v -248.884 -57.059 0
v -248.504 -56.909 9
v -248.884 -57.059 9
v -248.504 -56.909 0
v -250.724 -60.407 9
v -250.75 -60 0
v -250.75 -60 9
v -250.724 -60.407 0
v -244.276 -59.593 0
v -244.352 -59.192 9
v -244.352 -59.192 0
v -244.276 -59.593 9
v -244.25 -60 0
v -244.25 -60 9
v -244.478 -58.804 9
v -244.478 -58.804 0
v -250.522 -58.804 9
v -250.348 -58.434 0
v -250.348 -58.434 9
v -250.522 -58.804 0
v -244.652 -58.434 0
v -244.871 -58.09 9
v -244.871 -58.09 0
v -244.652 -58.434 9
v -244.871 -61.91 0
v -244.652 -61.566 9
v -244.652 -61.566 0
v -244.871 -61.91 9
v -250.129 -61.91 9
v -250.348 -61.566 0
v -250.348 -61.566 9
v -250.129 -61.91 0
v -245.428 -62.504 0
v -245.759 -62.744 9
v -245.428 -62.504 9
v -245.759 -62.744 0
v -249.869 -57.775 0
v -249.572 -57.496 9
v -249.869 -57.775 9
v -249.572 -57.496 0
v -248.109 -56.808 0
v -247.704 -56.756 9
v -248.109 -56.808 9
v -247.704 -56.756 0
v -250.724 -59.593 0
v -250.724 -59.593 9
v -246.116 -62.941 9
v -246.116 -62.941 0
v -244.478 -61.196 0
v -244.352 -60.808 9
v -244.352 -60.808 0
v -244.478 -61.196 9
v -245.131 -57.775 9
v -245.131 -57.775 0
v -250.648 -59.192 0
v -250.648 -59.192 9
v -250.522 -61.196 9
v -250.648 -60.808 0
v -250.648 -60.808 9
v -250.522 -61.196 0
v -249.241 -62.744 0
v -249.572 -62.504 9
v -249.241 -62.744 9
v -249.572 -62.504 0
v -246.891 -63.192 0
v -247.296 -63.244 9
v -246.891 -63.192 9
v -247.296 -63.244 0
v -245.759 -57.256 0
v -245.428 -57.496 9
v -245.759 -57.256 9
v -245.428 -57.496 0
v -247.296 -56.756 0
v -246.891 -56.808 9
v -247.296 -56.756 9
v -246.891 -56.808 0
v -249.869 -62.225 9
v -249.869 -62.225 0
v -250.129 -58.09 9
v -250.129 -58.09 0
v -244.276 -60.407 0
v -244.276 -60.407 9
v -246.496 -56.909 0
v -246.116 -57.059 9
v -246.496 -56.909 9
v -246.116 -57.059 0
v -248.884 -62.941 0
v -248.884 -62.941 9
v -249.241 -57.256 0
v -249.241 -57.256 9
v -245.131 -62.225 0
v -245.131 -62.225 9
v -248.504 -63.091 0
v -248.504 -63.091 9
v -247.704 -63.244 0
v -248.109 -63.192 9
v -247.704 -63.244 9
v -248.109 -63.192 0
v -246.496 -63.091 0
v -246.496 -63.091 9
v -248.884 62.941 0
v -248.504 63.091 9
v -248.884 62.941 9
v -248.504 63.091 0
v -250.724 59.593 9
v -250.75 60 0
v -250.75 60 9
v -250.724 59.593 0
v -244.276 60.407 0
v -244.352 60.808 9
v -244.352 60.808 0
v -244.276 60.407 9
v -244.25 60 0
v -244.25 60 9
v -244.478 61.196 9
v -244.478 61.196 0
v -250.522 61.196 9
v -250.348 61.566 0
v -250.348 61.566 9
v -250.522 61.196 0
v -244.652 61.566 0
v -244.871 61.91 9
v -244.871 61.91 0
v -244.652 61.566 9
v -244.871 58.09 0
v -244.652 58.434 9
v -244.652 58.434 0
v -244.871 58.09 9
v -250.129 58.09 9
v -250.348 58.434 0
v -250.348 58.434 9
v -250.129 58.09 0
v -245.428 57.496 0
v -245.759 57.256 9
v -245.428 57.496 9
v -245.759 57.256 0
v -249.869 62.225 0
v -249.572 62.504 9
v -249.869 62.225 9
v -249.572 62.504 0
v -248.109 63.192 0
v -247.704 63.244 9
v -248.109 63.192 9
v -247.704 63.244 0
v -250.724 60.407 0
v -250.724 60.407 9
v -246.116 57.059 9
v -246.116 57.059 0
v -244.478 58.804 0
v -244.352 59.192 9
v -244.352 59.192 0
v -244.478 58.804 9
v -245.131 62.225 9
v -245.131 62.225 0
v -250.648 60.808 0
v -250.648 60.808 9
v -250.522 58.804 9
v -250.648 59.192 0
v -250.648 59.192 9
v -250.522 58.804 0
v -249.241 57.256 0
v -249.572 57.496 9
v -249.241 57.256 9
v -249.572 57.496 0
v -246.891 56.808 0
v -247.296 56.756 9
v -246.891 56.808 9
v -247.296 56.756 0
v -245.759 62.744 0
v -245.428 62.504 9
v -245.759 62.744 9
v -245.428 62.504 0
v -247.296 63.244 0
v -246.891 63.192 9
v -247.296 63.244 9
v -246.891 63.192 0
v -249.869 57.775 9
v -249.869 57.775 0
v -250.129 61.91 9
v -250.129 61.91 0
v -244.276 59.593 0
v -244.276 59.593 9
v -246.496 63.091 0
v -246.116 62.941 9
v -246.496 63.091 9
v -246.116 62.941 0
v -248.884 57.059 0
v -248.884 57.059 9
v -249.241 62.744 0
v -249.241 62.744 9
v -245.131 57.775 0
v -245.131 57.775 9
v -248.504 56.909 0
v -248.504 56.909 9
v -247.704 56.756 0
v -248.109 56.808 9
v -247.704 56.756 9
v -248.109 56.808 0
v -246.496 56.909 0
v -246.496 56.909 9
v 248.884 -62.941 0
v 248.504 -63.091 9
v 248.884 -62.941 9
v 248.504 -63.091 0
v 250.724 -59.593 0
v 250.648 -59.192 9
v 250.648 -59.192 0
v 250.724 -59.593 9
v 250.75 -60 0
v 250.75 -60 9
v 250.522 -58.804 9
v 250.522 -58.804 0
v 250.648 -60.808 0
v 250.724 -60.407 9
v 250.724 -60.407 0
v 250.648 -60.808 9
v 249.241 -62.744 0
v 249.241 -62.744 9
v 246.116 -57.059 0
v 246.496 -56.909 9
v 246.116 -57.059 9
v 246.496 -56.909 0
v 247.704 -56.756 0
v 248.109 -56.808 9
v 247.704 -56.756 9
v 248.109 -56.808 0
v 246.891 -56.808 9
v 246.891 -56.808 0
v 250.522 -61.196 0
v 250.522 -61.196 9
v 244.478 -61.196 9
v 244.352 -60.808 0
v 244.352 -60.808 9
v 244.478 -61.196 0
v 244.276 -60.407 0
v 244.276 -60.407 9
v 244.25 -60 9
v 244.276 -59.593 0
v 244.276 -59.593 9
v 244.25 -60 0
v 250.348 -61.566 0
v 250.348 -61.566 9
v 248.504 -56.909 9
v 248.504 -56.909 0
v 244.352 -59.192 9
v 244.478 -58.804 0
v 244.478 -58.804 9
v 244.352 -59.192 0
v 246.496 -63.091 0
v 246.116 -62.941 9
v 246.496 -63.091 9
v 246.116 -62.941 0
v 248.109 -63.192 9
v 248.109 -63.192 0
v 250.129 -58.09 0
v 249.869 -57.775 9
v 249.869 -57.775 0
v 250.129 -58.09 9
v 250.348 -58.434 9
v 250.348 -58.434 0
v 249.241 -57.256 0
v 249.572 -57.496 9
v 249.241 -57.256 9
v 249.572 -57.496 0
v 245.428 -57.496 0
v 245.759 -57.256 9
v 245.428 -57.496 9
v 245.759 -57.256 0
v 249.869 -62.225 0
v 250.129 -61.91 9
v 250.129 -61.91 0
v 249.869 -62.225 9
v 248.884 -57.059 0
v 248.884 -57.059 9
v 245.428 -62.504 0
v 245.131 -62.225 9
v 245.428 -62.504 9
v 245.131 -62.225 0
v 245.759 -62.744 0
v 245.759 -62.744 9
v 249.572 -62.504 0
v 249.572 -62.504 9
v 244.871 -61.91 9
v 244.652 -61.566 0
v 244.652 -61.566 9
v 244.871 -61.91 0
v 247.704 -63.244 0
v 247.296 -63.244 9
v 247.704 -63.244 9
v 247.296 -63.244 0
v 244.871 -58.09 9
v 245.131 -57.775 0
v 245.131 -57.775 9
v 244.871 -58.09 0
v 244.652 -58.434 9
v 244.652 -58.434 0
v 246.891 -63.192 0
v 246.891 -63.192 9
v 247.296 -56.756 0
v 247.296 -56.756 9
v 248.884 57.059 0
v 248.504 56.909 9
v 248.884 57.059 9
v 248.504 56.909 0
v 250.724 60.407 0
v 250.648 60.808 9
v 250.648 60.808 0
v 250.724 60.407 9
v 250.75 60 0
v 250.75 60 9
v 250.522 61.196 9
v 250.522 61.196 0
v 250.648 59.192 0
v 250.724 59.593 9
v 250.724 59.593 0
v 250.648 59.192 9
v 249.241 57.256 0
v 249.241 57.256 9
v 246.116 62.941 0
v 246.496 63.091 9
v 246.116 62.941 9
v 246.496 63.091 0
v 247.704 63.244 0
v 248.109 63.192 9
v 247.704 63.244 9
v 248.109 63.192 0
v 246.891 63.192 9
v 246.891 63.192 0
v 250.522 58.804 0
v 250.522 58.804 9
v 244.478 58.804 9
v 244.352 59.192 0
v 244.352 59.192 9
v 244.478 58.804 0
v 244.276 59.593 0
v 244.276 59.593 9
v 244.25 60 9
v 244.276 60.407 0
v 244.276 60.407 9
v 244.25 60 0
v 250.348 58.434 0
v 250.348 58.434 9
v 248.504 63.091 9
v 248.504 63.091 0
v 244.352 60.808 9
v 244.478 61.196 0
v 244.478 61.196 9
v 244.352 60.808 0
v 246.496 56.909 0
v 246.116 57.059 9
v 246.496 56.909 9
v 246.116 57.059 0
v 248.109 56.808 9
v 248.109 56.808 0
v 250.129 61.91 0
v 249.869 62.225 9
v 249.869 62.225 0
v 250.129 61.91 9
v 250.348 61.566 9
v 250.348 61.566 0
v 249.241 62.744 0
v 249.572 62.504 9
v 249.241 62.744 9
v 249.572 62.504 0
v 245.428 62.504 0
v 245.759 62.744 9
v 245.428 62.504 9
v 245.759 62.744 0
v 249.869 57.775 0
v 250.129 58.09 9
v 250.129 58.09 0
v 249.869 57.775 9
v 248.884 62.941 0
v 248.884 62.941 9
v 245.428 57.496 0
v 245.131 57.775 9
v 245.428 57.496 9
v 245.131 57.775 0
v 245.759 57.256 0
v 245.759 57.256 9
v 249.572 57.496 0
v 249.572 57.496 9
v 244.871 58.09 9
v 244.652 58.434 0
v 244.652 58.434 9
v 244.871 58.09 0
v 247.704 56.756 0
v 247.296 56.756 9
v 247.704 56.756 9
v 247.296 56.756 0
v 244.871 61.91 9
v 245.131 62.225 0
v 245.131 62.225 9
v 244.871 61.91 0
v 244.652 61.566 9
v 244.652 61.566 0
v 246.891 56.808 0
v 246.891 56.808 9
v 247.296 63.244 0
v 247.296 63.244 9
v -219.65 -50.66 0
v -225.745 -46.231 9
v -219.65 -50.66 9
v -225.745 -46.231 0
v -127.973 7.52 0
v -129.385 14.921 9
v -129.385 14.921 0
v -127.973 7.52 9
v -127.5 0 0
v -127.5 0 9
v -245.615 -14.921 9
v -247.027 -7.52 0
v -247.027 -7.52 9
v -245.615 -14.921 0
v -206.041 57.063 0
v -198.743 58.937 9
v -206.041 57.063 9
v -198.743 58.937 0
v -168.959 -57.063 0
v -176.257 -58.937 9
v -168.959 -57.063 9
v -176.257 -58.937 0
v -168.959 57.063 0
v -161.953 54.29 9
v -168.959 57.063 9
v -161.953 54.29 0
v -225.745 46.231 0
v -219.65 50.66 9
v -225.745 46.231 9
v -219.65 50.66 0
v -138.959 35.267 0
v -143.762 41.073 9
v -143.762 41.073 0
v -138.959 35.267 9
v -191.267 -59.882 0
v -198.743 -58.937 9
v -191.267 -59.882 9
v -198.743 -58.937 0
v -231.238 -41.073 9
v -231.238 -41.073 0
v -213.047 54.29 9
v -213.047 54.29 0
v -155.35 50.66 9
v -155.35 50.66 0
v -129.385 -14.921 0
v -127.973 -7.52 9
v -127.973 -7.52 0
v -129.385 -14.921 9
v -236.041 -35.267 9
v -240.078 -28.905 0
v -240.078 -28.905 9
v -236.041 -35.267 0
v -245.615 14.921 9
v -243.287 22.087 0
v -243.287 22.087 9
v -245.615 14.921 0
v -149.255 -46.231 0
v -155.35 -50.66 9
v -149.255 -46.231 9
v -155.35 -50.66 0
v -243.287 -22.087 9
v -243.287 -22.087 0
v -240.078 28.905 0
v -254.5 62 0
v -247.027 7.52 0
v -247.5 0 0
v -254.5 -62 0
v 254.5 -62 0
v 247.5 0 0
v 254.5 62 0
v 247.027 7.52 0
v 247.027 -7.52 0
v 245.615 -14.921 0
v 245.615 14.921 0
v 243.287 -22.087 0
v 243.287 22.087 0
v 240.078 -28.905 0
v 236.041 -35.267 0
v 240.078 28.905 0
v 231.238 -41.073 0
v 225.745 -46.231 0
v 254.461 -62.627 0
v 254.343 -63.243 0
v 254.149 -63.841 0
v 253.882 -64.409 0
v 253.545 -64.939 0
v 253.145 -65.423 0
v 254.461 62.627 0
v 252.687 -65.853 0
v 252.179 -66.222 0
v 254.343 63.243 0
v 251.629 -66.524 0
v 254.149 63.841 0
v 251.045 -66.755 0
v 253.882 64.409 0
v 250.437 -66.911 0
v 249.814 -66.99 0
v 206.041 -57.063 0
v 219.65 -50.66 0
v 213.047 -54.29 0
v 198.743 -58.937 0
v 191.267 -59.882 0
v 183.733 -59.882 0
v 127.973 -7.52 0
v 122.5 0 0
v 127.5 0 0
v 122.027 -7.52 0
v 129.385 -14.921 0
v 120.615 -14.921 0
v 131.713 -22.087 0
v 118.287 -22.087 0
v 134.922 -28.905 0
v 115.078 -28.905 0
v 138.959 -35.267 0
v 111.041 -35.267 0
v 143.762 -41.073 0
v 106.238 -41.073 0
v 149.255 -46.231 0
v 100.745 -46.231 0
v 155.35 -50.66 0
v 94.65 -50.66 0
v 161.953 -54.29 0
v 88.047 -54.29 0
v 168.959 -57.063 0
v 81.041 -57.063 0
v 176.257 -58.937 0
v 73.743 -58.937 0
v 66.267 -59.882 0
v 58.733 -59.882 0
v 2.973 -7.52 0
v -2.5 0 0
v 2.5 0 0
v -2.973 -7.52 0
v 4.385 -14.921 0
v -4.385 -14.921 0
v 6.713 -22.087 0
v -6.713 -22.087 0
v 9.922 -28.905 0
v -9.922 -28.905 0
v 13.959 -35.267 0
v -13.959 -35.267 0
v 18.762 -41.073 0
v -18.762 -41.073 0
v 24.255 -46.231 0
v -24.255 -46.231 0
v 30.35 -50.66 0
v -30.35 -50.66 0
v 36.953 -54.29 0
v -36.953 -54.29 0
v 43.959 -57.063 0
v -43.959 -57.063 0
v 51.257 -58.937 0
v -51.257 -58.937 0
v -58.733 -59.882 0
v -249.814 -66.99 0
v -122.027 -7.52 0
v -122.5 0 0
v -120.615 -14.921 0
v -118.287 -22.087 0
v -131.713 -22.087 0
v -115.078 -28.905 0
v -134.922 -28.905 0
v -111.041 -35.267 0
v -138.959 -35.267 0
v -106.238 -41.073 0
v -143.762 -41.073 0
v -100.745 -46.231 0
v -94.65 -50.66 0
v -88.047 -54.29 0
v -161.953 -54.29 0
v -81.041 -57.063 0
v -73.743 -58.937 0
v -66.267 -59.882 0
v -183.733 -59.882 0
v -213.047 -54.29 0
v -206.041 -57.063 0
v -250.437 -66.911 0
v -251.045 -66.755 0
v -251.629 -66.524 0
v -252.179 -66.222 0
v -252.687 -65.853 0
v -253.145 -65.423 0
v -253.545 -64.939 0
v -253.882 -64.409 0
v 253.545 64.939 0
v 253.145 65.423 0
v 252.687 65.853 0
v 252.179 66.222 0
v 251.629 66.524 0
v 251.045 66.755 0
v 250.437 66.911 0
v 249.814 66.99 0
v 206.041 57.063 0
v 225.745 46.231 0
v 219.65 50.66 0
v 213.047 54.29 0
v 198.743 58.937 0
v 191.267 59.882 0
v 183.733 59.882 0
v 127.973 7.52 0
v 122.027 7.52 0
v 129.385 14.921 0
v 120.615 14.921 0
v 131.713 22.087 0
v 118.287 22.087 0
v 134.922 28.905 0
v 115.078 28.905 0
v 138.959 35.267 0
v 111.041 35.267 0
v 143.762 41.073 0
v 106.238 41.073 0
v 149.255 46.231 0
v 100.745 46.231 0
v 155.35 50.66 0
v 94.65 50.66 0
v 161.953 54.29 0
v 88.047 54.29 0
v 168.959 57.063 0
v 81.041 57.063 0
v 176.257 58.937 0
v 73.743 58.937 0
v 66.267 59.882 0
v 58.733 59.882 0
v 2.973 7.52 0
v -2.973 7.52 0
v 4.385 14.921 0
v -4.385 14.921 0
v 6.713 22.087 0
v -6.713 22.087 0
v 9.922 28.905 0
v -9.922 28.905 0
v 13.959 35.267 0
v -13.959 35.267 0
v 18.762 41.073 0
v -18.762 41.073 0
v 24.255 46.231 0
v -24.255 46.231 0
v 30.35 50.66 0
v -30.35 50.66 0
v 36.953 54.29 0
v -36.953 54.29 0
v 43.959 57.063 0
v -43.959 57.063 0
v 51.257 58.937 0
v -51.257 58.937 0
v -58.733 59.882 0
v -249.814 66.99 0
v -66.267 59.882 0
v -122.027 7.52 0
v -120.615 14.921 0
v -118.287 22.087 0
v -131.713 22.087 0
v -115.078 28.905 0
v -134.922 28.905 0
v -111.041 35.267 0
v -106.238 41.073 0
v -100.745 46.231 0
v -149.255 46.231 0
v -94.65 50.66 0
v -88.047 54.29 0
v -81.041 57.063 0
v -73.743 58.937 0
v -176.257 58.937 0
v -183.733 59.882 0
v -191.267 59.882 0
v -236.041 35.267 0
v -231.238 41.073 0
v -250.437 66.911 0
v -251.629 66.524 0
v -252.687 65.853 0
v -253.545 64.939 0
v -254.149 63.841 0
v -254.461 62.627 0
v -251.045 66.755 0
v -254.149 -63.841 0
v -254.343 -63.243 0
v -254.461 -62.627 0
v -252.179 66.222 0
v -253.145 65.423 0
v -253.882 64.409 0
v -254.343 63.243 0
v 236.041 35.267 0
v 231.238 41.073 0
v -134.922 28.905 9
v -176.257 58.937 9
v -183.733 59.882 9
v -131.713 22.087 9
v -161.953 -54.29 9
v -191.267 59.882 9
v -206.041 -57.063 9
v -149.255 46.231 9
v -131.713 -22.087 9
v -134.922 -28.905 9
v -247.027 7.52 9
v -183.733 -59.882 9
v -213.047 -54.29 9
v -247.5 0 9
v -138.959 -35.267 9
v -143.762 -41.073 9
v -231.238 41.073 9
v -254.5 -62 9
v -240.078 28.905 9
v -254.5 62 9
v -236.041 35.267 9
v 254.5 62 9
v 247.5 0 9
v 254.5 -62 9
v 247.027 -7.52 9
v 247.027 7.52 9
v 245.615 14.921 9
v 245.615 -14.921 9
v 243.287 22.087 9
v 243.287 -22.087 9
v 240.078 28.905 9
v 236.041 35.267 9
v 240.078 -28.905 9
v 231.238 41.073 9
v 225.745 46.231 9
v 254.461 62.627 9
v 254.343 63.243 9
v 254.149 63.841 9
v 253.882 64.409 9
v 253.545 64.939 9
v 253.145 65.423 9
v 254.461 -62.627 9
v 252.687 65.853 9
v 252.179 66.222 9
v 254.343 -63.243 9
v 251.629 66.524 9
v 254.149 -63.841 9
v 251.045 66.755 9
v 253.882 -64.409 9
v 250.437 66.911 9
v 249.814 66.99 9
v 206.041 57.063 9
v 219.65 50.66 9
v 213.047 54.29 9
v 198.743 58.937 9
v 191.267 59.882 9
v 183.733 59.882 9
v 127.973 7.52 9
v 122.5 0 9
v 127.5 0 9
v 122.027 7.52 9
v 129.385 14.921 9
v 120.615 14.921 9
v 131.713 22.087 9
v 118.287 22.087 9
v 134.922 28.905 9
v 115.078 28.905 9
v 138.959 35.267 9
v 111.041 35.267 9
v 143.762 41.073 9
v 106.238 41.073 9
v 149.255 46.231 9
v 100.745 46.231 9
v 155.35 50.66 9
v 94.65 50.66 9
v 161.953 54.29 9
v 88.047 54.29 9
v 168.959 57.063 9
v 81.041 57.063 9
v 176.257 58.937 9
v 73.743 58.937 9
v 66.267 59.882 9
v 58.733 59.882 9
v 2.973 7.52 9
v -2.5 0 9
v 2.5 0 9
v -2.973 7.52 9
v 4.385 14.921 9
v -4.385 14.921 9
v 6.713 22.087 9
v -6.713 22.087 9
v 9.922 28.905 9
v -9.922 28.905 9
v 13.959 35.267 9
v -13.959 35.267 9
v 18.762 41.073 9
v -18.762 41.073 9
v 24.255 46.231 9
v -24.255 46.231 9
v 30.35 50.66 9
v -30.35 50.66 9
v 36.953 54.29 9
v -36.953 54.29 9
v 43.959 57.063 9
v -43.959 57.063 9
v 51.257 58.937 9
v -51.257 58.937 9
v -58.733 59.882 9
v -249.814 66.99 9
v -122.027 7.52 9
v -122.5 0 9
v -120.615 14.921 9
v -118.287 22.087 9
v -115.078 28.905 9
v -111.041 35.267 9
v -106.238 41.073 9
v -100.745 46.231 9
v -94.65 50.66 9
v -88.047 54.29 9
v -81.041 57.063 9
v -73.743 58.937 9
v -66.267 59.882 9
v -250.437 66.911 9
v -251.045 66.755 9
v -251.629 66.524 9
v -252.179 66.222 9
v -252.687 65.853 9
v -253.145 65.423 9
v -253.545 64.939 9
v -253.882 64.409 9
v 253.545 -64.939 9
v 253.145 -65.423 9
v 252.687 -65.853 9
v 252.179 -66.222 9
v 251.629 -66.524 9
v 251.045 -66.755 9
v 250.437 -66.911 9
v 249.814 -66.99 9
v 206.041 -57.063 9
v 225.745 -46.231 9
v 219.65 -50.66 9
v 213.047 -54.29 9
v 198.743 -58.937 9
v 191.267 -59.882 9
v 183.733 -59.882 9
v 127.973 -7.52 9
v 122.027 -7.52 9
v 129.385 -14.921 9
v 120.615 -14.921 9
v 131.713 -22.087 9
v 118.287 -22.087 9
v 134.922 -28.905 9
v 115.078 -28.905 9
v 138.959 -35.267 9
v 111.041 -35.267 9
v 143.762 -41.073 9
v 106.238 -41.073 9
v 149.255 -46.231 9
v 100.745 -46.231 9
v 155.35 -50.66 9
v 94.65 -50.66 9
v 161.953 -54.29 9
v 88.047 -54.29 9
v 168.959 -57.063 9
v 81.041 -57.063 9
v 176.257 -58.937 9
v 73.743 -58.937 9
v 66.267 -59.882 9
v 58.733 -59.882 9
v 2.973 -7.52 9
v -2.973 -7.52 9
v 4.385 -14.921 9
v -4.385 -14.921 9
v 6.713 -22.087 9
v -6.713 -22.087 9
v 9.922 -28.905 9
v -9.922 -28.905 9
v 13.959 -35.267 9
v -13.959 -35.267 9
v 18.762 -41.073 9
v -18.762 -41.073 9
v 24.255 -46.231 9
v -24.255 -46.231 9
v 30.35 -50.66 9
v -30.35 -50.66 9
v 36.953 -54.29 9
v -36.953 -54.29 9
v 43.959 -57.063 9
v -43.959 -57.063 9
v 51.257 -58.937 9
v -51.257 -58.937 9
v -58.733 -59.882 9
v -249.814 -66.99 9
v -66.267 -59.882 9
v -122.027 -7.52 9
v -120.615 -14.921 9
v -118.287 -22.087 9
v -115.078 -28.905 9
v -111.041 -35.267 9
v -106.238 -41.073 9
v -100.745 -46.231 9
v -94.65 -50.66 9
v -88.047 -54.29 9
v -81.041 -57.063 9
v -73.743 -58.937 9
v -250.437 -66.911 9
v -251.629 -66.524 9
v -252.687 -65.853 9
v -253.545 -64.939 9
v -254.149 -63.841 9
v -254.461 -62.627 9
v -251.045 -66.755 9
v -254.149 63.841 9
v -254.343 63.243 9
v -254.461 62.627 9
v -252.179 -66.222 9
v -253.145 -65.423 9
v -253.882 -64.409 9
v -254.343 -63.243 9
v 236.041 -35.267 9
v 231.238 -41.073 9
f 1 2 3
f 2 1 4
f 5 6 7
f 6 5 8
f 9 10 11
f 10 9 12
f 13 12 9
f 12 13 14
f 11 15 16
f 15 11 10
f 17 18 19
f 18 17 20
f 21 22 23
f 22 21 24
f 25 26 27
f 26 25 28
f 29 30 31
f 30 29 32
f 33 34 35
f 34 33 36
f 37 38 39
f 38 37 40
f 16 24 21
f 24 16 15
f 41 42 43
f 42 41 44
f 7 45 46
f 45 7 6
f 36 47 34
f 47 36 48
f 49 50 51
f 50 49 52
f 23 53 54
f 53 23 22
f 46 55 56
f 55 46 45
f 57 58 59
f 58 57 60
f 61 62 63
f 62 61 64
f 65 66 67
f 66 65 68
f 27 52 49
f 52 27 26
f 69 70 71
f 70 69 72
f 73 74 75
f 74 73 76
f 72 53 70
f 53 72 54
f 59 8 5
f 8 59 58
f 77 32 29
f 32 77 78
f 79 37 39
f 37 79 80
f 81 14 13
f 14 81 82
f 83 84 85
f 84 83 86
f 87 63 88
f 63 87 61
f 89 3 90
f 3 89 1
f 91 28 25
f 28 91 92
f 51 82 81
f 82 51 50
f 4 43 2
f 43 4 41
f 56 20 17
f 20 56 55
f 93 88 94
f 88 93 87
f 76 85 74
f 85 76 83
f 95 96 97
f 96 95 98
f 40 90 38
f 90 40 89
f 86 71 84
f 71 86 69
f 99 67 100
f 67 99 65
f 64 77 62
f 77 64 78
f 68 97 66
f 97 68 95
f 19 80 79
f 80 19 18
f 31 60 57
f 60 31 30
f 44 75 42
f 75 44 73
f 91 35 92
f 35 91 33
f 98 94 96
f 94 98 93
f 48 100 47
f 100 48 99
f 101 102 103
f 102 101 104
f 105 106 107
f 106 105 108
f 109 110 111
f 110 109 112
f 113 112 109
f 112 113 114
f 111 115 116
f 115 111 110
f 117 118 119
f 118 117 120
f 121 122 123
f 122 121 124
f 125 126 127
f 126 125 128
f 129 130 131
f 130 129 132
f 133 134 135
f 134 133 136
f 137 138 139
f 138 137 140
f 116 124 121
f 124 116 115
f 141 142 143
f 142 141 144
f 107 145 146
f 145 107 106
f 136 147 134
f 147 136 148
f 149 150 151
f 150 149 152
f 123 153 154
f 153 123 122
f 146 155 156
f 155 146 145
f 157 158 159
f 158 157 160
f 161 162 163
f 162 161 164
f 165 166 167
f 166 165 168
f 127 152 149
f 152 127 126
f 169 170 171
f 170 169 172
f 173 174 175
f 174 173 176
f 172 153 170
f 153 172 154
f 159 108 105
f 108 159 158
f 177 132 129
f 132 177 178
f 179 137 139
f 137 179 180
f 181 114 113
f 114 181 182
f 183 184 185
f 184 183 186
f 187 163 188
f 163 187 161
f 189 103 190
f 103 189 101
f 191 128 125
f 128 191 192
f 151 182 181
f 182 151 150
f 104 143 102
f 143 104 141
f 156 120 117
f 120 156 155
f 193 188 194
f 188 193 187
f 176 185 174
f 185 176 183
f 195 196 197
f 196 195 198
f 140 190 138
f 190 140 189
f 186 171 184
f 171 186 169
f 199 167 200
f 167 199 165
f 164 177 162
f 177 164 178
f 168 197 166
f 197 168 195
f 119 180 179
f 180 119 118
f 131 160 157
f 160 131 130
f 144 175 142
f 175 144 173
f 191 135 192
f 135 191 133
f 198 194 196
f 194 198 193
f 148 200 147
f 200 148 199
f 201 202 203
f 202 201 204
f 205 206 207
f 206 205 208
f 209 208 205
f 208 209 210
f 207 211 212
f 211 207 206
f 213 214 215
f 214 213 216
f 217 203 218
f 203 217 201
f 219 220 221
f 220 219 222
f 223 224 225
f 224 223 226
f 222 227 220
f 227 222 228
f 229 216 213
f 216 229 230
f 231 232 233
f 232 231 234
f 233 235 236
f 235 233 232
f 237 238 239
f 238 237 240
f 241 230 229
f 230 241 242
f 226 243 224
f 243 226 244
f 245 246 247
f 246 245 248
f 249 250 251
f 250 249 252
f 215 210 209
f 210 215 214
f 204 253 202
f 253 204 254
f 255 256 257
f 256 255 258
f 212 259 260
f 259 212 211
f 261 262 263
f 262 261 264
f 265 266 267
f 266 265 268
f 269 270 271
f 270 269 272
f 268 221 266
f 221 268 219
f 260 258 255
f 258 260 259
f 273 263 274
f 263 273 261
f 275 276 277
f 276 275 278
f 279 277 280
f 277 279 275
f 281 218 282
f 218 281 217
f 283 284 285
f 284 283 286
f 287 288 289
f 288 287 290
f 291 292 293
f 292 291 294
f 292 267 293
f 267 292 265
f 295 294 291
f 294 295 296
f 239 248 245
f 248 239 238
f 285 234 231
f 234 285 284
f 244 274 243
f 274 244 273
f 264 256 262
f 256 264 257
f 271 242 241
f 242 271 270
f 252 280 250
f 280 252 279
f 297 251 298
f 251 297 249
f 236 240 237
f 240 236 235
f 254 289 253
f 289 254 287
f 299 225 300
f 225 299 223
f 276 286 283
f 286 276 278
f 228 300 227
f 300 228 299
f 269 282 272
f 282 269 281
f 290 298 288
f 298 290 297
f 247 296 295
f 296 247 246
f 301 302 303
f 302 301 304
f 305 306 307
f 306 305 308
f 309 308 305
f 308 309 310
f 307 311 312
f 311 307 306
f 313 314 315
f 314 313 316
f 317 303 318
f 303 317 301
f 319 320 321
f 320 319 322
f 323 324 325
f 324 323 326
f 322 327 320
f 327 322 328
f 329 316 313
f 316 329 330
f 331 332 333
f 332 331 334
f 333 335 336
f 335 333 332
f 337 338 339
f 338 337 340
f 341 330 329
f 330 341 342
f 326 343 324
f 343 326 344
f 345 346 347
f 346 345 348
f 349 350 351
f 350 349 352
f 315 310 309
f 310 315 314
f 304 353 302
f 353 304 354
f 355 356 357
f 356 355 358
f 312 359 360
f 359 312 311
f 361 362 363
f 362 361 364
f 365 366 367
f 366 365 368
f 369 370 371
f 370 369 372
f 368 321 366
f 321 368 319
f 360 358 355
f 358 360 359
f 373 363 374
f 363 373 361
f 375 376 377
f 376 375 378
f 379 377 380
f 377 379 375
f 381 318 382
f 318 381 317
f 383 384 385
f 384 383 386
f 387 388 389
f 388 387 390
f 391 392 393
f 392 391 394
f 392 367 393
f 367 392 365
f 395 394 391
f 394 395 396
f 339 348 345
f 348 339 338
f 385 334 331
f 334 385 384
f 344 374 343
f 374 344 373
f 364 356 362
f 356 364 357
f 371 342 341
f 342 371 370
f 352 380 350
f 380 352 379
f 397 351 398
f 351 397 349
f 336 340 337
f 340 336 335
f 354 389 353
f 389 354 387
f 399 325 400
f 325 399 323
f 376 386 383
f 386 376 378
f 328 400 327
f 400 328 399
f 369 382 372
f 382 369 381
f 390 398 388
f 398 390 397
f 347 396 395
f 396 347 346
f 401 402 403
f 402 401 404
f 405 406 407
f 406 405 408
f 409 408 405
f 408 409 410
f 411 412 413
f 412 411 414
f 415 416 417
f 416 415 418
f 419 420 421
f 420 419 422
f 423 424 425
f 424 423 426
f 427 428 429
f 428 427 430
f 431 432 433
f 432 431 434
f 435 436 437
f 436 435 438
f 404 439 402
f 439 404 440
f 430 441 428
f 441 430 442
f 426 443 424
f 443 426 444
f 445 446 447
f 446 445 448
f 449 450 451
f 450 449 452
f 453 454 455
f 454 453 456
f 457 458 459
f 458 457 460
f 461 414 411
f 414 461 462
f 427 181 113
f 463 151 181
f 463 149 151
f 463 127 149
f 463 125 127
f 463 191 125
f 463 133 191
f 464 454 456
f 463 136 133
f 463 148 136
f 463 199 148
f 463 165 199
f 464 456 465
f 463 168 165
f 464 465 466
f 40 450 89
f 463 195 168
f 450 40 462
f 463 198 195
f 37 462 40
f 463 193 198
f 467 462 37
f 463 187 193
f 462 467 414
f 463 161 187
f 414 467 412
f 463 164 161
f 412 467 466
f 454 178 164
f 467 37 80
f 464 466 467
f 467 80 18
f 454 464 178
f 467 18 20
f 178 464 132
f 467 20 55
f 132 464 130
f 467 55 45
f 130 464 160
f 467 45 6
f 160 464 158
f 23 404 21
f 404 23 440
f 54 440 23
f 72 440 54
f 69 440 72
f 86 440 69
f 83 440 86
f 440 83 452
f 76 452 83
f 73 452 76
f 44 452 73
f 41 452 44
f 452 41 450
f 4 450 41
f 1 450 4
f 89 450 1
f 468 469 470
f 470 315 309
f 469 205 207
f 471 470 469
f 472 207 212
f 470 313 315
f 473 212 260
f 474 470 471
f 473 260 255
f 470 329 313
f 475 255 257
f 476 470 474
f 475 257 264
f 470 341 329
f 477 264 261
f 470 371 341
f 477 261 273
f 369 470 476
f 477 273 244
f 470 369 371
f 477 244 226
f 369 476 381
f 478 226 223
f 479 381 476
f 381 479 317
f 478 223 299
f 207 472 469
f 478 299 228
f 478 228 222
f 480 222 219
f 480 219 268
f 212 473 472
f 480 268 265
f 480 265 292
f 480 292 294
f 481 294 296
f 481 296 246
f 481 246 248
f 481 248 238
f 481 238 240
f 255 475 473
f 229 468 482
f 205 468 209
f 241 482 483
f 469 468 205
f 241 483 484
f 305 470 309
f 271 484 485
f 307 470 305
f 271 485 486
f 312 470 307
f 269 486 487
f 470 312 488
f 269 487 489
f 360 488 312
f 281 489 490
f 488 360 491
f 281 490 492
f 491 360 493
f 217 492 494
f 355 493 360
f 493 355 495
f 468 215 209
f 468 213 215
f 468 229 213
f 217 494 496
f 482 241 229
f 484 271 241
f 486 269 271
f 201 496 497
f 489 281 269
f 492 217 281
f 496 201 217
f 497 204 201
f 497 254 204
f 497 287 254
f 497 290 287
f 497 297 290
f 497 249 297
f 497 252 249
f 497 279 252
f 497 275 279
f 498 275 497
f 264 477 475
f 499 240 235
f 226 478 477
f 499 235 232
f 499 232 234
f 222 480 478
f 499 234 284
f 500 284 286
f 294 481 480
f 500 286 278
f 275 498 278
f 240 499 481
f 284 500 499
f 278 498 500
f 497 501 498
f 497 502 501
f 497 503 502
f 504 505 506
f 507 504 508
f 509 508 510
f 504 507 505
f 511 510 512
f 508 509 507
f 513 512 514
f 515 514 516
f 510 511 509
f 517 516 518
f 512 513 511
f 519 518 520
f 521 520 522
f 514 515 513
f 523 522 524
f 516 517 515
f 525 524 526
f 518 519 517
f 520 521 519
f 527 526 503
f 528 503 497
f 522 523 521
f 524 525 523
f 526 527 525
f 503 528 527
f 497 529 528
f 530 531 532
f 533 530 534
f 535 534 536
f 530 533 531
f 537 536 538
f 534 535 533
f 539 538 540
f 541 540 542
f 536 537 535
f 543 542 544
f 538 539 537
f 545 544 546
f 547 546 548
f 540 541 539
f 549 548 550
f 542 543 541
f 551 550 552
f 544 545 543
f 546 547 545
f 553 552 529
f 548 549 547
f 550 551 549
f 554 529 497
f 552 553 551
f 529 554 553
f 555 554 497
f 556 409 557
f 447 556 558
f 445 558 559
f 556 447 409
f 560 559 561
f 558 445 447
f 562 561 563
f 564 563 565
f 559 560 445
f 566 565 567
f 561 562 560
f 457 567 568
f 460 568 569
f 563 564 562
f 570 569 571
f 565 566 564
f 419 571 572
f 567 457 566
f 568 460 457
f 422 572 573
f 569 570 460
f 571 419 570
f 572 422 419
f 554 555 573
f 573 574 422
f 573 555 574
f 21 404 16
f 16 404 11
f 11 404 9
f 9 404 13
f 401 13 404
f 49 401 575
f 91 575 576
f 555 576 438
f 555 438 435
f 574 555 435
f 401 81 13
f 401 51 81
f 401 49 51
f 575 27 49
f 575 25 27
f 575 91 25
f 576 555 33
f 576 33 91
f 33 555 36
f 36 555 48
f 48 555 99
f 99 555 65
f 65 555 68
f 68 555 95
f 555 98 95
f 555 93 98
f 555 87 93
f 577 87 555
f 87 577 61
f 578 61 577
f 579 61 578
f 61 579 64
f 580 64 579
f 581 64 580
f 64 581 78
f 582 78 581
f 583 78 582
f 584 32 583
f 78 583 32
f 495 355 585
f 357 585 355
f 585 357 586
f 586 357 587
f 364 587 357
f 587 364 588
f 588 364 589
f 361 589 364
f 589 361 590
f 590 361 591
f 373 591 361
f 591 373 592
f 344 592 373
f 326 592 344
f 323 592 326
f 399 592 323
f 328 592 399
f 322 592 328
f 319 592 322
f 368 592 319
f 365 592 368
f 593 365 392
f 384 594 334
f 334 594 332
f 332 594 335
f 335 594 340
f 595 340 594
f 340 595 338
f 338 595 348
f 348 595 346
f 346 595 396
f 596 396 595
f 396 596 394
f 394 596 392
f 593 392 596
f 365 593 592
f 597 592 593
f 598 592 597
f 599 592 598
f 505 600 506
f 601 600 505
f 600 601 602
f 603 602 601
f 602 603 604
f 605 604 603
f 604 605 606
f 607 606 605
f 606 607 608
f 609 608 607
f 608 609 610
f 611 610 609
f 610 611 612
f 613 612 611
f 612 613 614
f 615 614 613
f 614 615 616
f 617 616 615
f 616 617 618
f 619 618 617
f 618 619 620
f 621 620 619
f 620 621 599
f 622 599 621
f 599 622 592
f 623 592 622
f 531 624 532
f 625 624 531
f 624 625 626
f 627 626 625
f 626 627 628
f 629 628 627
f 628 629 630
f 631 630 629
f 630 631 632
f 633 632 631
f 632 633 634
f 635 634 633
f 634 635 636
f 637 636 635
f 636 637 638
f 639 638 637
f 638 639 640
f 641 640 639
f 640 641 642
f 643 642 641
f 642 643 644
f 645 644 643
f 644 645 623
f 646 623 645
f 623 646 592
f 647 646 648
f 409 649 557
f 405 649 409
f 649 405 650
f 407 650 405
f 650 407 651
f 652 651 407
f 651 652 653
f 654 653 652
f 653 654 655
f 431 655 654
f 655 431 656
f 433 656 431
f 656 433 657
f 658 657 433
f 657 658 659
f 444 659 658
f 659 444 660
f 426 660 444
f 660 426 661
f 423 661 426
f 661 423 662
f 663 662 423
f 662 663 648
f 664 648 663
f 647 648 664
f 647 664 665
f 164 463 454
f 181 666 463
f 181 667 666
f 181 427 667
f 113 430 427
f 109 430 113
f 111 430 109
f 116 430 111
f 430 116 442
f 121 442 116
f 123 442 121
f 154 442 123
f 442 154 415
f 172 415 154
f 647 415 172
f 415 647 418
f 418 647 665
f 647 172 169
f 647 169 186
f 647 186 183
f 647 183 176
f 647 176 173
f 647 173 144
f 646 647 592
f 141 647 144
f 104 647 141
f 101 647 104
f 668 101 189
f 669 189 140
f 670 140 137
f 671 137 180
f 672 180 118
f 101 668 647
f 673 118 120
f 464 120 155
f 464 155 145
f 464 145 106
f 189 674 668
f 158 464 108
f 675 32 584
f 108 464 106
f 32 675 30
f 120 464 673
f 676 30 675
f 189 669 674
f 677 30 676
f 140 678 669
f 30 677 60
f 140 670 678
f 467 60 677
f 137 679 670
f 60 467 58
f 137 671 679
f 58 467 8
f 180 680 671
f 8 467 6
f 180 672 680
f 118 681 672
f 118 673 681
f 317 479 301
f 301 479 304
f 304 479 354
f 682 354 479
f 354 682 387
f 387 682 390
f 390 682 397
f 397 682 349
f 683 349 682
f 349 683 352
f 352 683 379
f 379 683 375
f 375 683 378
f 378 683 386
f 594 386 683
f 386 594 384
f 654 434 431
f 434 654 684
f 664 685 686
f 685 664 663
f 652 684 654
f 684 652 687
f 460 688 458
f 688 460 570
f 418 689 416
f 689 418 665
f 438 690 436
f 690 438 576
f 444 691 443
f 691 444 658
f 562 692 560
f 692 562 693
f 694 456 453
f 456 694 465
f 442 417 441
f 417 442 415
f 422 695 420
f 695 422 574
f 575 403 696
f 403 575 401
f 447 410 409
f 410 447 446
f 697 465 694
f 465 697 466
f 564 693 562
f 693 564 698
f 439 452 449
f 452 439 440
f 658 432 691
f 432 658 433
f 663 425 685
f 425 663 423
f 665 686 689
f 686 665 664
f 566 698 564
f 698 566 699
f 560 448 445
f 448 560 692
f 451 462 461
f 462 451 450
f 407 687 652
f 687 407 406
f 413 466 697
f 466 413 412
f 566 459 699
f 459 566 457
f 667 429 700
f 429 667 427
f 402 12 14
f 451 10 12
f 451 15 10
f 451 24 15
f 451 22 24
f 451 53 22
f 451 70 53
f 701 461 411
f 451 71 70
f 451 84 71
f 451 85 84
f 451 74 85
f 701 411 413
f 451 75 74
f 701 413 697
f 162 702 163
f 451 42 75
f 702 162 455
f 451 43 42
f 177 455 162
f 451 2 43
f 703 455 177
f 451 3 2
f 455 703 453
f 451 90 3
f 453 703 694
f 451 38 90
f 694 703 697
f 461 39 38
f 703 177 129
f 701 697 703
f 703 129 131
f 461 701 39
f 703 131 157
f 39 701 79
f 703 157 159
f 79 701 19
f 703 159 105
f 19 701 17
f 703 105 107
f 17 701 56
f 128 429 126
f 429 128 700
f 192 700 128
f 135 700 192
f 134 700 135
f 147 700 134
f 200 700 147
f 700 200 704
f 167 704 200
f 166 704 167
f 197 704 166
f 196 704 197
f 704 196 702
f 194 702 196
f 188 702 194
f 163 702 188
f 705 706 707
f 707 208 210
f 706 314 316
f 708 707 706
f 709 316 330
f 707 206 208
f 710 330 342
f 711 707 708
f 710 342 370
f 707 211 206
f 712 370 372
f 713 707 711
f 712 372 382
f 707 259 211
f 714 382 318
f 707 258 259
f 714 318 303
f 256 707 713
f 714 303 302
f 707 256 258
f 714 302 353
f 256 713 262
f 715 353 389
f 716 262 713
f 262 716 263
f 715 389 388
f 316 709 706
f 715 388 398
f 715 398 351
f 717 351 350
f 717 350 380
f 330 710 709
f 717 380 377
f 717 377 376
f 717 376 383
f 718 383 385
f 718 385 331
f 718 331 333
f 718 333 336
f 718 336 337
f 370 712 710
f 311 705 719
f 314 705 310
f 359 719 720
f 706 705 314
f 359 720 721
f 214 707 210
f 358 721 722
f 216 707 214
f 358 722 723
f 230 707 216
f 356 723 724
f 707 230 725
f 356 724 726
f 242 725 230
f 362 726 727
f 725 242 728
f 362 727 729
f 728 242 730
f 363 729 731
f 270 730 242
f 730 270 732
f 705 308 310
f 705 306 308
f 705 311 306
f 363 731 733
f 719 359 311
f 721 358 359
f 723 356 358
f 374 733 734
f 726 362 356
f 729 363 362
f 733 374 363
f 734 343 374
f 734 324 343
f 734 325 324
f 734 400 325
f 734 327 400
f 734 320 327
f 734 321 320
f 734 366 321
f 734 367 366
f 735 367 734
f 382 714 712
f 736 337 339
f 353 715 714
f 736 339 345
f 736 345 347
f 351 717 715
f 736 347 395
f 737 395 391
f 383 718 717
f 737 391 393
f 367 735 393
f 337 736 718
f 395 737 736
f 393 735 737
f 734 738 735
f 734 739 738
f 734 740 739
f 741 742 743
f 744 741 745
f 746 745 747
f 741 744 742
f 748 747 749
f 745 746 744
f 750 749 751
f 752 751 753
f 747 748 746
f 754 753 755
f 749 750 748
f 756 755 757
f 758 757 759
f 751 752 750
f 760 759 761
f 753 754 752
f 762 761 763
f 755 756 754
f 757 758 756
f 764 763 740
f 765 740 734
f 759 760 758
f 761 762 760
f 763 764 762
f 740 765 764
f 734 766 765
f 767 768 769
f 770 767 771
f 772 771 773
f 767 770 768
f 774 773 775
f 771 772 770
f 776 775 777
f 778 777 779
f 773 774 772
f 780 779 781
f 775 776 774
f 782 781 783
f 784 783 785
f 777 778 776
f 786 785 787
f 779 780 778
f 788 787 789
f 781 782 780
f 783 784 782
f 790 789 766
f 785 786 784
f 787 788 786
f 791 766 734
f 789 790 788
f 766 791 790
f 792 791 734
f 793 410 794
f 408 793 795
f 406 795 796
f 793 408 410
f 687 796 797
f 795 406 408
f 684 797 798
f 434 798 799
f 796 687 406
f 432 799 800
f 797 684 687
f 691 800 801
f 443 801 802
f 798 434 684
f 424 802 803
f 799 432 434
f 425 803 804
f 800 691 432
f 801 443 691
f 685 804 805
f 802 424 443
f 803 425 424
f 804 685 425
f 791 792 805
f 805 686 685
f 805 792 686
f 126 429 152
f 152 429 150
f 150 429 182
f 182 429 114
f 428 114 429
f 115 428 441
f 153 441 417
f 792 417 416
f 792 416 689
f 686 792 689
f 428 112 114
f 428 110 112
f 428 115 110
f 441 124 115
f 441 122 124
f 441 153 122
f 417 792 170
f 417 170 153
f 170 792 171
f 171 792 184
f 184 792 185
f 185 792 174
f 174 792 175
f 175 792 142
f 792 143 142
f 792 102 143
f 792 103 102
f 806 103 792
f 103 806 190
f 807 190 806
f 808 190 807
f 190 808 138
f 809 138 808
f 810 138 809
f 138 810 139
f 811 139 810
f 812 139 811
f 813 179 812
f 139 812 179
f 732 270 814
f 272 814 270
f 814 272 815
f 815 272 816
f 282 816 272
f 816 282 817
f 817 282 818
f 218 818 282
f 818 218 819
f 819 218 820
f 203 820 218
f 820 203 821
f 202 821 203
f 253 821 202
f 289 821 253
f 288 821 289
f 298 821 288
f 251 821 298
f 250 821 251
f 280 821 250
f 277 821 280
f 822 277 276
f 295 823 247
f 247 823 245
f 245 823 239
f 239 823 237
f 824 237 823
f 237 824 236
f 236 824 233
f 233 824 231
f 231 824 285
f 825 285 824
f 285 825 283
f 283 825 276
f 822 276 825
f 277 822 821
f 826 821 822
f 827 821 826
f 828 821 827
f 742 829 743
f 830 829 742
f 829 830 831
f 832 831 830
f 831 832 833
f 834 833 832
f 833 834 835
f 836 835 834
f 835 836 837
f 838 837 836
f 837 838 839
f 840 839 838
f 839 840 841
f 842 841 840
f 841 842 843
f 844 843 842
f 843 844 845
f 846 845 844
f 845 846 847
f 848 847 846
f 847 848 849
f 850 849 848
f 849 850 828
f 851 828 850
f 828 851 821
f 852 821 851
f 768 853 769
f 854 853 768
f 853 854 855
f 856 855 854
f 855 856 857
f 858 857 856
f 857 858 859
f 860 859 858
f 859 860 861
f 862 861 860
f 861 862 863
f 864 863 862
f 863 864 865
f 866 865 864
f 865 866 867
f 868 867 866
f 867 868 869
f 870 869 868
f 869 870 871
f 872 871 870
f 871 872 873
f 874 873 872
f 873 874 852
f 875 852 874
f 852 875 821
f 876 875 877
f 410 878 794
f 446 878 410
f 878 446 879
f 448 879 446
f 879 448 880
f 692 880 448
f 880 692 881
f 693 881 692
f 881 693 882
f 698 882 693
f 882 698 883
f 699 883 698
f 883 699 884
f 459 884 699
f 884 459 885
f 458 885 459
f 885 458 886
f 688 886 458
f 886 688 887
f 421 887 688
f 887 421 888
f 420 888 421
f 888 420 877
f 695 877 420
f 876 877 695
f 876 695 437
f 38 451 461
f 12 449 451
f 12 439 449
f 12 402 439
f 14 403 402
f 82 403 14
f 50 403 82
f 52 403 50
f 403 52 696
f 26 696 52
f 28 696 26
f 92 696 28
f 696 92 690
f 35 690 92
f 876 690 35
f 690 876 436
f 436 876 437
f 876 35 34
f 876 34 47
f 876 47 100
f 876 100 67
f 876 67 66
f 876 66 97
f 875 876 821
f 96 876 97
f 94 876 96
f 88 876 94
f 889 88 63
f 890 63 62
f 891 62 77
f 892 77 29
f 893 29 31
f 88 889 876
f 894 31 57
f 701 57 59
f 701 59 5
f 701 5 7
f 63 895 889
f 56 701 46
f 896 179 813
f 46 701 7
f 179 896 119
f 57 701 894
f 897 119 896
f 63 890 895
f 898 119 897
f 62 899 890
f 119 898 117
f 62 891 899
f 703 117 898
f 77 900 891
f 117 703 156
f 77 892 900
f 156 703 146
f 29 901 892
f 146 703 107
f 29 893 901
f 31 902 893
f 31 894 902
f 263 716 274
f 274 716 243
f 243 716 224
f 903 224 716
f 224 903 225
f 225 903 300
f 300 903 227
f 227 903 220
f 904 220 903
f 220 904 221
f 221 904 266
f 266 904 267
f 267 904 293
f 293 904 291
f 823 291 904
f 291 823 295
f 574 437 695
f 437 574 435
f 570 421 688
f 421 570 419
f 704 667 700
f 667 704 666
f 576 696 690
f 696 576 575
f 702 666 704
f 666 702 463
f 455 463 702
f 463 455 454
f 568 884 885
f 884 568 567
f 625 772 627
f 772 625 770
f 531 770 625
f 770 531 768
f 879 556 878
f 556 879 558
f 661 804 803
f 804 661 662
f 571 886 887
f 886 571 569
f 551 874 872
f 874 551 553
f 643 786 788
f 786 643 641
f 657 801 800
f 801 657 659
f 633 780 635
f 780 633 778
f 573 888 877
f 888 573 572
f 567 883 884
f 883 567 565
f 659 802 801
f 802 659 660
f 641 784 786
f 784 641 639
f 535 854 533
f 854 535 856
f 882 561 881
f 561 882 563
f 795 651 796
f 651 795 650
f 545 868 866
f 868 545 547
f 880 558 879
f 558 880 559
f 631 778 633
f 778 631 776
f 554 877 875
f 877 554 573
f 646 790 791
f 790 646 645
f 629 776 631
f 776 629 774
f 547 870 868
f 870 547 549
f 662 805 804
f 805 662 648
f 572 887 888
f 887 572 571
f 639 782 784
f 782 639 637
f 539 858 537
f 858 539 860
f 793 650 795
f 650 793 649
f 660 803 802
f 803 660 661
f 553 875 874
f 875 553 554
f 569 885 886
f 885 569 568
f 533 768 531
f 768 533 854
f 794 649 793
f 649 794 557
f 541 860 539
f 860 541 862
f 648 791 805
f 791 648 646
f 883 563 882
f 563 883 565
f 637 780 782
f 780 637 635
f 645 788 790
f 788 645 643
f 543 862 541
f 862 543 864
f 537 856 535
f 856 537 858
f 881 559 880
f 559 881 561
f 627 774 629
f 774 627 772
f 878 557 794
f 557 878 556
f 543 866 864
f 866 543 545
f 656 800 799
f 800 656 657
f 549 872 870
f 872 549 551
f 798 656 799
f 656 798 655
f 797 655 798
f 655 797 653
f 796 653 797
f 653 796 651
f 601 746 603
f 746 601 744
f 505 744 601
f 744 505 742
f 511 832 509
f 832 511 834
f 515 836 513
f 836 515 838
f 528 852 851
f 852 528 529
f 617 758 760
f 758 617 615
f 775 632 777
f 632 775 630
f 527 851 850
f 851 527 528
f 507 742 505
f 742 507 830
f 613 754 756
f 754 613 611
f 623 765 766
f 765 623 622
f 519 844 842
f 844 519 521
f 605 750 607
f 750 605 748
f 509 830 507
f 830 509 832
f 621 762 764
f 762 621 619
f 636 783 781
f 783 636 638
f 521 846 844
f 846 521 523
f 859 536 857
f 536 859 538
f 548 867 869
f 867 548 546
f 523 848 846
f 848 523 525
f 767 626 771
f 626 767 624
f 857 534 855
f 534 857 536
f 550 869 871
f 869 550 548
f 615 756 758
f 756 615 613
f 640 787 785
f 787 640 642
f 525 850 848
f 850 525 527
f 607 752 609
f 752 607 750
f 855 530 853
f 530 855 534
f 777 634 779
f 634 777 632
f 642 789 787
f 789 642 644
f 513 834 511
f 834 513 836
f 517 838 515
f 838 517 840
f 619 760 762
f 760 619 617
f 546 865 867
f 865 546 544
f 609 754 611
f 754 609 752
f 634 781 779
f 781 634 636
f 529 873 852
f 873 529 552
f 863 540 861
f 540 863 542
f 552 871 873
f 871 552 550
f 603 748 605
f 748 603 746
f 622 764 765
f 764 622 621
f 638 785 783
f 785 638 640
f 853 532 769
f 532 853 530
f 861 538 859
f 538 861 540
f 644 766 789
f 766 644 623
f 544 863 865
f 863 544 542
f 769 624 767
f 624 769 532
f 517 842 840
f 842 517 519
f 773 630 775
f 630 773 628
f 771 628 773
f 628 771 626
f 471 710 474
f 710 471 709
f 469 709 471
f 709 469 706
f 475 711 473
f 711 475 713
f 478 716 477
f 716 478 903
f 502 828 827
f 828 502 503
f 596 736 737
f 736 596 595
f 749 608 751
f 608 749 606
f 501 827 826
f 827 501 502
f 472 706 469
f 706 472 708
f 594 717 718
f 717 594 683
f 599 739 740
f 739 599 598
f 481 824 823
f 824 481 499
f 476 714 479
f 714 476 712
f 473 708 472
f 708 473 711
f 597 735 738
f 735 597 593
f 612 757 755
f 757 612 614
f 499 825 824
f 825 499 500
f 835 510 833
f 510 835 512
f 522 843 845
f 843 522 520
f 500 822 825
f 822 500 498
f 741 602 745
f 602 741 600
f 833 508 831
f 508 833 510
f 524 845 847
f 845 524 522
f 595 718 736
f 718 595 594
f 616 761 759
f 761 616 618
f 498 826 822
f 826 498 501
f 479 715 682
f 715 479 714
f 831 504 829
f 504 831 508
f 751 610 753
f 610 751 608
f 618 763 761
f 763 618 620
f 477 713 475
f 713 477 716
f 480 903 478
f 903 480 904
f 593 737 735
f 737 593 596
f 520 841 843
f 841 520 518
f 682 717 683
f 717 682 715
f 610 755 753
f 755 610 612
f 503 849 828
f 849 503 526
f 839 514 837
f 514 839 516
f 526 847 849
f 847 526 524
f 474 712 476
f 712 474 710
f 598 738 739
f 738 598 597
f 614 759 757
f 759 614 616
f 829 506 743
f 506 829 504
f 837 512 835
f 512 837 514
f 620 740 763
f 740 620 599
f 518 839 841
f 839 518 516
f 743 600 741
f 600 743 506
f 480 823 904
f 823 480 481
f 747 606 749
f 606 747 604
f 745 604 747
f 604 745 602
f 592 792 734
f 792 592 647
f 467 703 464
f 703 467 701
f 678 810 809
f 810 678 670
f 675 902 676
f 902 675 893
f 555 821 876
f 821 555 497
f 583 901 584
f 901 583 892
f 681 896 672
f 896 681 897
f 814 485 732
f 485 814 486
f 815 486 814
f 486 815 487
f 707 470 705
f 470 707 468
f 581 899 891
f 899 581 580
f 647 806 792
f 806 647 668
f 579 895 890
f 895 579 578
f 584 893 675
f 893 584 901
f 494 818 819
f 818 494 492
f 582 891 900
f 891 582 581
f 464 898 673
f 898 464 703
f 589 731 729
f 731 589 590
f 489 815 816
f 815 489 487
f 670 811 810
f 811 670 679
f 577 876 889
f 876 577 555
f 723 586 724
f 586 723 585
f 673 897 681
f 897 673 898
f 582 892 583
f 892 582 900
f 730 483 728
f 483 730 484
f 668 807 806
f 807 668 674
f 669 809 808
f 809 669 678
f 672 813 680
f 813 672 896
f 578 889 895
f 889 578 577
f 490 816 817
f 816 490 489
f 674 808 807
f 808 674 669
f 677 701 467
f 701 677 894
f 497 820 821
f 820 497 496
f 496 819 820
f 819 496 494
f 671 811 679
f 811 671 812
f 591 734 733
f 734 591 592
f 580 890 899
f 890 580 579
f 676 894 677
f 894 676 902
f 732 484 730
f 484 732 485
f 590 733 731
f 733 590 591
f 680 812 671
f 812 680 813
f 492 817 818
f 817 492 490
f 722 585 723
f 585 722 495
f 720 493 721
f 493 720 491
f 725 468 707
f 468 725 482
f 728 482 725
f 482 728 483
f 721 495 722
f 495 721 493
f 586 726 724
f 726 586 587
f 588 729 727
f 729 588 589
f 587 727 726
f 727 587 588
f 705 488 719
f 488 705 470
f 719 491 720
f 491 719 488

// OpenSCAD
$fn = 50;


difference() {
	union() {
		hull() {
			translate(v = [-249.5000000000, 62.0000000000, 0]) {
				cylinder(h = 9, r = 5);
			}
			translate(v = [249.5000000000, 62.0000000000, 0]) {
				cylinder(h = 9, r = 5);
			}
			translate(v = [-249.5000000000, -62.0000000000, 0]) {
				cylinder(h = 9, r = 5);
			}
			translate(v = [249.5000000000, -62.0000000000, 0]) {
				cylinder(h = 9, r = 5);
			}
		}
	}
	union() {
		#translate(v = [-247.5000000000, -60.0000000000, -100.0000000000]) {
			cylinder(h = 200, r = 3.2500000000);
		}
		#translate(v = [-247.5000000000, 60.0000000000, -100.0000000000]) {
			cylinder(h = 200, r = 3.2500000000);
		}
		#translate(v = [247.5000000000, -60.0000000000, -100.0000000000]) {
			cylinder(h = 200, r = 3.2500000000);
		}
		#translate(v = [247.5000000000, 60.0000000000, -100.0000000000]) {
			cylinder(h = 200, r = 3.2500000000);
		}
		#translate(v = [-187.5000000000, 0, 0]) {
			cylinder(h = 9, r = 60.0000000000);
		}
		#translate(v = [-62.5000000000, 0, 0]) {
			cylinder(h = 9, r = 60.0000000000);
		}
		#translate(v = [62.5000000000, 0, 0]) {
			cylinder(h = 9, r = 60.0000000000);
		}
		#translate(v = [187.5000000000, 0, 0]) {
			cylinder(h = 9, r = 60.0000000000);
		}
	}
}
